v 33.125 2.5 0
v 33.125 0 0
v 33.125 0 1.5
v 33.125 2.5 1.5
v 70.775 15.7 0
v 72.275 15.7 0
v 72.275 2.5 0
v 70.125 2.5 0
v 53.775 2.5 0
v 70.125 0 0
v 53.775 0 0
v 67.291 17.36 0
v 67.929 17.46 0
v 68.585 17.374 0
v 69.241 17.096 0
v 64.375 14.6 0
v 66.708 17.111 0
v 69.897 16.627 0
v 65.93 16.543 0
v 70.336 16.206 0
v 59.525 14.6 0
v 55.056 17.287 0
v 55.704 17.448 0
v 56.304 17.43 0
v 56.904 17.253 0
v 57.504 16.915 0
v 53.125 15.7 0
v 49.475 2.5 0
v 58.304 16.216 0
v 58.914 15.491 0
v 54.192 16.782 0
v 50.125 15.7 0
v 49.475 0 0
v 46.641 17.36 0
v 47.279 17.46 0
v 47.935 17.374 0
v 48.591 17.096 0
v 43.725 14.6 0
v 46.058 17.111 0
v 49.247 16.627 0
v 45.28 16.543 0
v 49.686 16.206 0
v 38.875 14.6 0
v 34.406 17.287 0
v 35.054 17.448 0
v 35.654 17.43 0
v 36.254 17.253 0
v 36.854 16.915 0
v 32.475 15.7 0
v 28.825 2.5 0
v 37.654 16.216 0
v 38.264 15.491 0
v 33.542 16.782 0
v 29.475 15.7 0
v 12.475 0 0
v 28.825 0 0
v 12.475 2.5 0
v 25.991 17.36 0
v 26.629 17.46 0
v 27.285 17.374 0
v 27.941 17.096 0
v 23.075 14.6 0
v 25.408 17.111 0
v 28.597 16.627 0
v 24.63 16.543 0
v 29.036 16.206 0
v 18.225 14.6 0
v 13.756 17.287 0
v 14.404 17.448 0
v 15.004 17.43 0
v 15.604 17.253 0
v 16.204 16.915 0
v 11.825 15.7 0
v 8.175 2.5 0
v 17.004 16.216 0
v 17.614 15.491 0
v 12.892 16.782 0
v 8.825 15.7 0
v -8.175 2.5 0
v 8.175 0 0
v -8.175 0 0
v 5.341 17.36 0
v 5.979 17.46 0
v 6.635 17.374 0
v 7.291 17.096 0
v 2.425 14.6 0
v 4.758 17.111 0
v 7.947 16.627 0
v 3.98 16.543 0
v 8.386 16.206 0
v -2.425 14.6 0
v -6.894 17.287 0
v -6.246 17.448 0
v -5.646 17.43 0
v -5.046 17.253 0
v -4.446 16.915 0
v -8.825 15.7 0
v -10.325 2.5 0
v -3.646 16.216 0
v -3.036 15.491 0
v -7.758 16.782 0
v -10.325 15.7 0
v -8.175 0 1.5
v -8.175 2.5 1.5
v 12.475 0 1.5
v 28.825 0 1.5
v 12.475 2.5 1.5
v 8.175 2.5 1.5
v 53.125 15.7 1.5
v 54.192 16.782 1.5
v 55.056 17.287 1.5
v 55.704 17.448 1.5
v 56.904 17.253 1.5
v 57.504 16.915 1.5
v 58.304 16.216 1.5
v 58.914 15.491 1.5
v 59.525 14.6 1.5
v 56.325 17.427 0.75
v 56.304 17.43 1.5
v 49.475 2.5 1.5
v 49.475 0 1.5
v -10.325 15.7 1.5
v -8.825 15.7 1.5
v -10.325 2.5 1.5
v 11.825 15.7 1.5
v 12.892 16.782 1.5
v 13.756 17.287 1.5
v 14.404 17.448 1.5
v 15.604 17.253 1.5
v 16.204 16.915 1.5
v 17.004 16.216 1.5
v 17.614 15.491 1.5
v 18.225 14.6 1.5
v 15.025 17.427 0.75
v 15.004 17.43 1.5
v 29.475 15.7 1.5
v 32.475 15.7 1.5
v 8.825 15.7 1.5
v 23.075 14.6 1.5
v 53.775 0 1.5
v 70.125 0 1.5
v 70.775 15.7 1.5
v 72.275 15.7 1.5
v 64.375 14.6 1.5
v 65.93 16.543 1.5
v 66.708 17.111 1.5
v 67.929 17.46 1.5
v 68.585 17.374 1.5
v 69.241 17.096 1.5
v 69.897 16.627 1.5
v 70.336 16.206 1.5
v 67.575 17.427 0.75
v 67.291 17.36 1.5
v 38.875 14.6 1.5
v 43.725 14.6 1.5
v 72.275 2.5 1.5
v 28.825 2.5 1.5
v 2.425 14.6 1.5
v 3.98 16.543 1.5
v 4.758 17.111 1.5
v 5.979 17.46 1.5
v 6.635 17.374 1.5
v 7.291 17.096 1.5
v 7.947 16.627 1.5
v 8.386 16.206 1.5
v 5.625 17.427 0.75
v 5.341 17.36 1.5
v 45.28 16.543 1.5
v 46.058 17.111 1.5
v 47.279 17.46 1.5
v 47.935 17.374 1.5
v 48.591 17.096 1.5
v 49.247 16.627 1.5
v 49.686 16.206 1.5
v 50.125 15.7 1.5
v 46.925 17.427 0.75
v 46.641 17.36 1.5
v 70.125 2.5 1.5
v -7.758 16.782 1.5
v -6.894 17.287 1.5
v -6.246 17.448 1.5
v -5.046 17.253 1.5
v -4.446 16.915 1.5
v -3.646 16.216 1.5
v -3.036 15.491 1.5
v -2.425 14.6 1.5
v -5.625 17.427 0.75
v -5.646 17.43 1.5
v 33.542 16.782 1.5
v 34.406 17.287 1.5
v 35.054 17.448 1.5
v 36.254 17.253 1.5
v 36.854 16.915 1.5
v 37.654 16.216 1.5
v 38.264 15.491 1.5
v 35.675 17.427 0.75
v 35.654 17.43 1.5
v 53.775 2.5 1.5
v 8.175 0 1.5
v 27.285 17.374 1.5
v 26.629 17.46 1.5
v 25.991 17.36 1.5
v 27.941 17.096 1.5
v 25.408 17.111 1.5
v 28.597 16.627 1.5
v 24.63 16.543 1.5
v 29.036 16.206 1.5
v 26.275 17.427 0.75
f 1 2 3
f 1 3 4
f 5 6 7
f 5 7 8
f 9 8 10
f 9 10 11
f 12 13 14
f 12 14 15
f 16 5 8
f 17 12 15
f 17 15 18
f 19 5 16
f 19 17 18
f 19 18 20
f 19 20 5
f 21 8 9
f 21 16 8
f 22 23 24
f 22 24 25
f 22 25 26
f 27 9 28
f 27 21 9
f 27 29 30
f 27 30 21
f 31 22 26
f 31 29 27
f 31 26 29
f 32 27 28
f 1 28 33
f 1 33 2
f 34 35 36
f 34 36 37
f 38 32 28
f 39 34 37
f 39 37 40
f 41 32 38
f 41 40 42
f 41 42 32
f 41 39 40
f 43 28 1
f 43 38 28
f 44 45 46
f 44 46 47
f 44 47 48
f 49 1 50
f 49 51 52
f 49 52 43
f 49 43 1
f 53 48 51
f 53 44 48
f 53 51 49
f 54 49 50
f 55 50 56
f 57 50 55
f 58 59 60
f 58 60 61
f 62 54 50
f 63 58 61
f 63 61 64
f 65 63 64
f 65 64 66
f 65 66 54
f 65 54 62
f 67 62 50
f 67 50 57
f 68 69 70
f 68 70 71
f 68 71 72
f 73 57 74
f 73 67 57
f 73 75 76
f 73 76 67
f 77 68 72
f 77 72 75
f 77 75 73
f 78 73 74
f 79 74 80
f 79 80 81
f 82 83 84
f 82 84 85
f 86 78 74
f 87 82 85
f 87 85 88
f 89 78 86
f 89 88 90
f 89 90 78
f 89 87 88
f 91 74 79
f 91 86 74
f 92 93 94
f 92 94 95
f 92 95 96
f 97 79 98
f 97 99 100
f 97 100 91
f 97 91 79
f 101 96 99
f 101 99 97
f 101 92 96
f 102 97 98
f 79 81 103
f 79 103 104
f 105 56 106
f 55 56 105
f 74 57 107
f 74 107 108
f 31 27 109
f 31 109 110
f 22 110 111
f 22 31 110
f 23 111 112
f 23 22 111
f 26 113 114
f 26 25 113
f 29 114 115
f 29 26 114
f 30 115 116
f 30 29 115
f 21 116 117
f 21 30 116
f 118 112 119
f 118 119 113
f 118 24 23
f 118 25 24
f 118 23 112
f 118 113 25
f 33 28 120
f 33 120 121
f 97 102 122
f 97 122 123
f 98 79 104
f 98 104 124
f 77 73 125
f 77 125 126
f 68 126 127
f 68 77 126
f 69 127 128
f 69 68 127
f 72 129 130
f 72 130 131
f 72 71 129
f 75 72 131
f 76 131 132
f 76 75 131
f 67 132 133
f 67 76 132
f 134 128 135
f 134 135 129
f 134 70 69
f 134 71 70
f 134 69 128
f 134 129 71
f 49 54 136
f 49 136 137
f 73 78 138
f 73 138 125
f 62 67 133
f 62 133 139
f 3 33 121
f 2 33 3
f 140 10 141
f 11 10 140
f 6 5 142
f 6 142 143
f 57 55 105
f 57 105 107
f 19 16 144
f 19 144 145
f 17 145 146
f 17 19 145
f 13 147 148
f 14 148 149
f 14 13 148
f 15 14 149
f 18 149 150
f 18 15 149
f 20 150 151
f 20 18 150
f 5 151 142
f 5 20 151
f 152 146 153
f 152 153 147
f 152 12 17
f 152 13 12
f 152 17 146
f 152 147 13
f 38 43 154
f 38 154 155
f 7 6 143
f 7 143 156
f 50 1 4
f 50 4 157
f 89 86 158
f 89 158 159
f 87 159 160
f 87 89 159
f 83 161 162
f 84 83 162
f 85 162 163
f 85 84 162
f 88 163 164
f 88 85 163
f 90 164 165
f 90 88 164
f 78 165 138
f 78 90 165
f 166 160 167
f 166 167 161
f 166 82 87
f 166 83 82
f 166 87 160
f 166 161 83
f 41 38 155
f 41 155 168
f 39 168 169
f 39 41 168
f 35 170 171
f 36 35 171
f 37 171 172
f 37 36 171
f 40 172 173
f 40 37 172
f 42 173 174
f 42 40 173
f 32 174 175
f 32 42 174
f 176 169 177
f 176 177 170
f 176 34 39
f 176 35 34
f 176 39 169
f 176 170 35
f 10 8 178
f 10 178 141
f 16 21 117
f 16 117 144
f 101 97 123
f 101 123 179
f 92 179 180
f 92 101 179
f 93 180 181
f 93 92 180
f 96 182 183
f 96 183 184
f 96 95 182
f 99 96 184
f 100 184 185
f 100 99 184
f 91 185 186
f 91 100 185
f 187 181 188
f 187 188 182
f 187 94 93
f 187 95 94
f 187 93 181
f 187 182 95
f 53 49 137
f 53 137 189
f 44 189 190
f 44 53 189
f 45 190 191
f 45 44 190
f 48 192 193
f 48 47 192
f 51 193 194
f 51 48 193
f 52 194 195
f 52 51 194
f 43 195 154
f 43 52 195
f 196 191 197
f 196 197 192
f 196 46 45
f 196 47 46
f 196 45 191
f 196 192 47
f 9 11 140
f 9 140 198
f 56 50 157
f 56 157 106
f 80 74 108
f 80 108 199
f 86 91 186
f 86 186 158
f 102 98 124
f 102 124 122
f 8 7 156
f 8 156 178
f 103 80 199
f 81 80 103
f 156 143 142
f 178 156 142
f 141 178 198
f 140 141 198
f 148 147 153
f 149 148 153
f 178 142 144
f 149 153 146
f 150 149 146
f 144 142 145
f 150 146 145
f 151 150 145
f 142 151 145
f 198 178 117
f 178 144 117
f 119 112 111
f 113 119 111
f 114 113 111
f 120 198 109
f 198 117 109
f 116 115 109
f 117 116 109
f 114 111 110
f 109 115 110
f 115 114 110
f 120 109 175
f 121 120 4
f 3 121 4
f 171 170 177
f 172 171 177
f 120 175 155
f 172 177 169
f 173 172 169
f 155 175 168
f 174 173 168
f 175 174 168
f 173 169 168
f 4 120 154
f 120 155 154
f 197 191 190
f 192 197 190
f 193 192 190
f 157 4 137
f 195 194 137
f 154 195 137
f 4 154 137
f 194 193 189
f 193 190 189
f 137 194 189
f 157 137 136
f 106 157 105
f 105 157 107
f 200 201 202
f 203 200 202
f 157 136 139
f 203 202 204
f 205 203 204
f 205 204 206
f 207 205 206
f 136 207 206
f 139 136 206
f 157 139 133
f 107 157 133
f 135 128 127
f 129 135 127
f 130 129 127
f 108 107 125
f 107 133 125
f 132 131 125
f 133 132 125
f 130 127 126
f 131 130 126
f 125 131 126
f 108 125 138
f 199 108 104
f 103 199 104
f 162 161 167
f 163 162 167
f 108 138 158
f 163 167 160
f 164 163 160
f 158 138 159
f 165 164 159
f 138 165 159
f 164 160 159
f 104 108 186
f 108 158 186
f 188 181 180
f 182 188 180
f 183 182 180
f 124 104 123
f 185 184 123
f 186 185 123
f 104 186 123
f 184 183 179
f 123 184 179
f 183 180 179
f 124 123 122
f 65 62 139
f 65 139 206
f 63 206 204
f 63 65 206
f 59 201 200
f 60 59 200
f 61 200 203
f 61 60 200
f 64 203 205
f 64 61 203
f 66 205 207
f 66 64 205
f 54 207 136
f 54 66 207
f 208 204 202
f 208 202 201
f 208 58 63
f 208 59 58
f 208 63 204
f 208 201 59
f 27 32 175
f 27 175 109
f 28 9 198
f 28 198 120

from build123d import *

# Parameters (mm, degrees)
EXTRUDE1_DEPTH = 1.5


with BuildPart() as part:
    # Sketch1 → Extrude1 (new body)
    with BuildSketch(Plane.XY):
        with BuildLine():
            Line((70.775, 15.7), (72.275, 15.7))
            Line((72.275, 15.7), (72.275, 2.5))
            Line((72.275, 2.5), (70.125, 2.5))
            Line((70.125, 2.5), (70.125, 0))
            Line((70.125, 0), (53.775, 0))
            Line((53.775, 0), (53.775, 2.5))
            Line((53.775, 2.5), (51.625, 2.5))
            Line((51.625, 2.5), (49.475, 2.5))
            Line((49.475, 2.5), (49.475, 0))
            Line((49.475, 0), (33.125, 0))
            Line((33.125, 0), (33.125, 2.5))
            Line((33.125, 2.5), (30.975, 2.5))
            Line((30.975, 2.5), (28.825, 2.5))
            Line((28.825, 2.5), (28.825, 0))
            Line((28.825, 0), (12.475, 0))
            Line((12.475, 0), (12.475, 2.5))
            Line((12.475, 2.5), (10.325, 2.5))
            Line((10.325, 2.5), (8.175, 2.5))
            Line((8.175, 2.5), (8.175, 0))
            Line((8.175, 0), (-8.175, 0))
            Line((-8.175, 0), (-8.175, 2.5))
            Line((-8.175, 2.5), (-10.325, 2.5))
            Line((-10.325, 2.5), (-10.325, 15.7))
            Line((-10.325, 15.7), (-8.825000006, 15.7))
            add(Edge.make_bspline(
                [(-8.825000006, 15.7), (-5.625000003, 19.70356859), (-2.425, 14.6)],
                knots=[0, 0, 0, 1, 1, 1], degree=2))
            Line((-2.425, 14.6), (2.425000009, 14.6))
            add(Edge.make_bspline(
                [(2.425000009, 14.6), (5.625000004, 19.703568583), (8.825, 15.7)],
                knots=[0, 0, 0, 1, 1, 1], degree=2))
            Line((8.825, 15.7), (10.325, 15.7))
            Line((10.325, 15.7), (11.824999994, 15.7))
            add(Edge.make_bspline(
                [(11.824999994, 15.7), (15.024999997, 19.70356859), (18.225, 14.6)],
                knots=[0, 0, 0, 1, 1, 1], degree=2))
            Line((18.225, 14.6), (23.075000009, 14.6))
            add(Edge.make_bspline(
                [(23.075000009, 14.6), (26.275000004, 19.703568583), (29.475, 15.7)],
                knots=[0, 0, 0, 1, 1, 1], degree=2))
            Line((29.475, 15.7), (30.975, 15.7))
            Line((30.975, 15.7), (32.474999994, 15.7))
            add(Edge.make_bspline(
                [(32.474999994, 15.7), (35.674999997, 19.70356859), (38.875, 14.6)],
                knots=[0, 0, 0, 1, 1, 1], degree=2))
            Line((38.875, 14.6), (43.725000009, 14.6))
            add(Edge.make_bspline(
                [(43.725000009, 14.6), (46.925000004, 19.703568583), (50.125, 15.7)],
                knots=[0, 0, 0, 1, 1, 1], degree=2))
            Line((50.125, 15.7), (51.625, 15.7))
            Line((51.625, 15.7), (53.124999994, 15.7))
            add(Edge.make_bspline(
                [(53.124999994, 15.7), (56.324999997, 19.70356859), (59.525, 14.6)],
                knots=[0, 0, 0, 1, 1, 1], degree=2))
            Line((59.525, 14.6), (64.375000009, 14.6))
            add(Edge.make_bspline(
                [(64.375000009, 14.6), (67.575000004, 19.703568583), (70.775, 15.7)],
                knots=[0, 0, 0, 1, 1, 1], degree=2))
        make_face()
    extrude(amount=EXTRUDE1_DEPTH)


solid = part.part
